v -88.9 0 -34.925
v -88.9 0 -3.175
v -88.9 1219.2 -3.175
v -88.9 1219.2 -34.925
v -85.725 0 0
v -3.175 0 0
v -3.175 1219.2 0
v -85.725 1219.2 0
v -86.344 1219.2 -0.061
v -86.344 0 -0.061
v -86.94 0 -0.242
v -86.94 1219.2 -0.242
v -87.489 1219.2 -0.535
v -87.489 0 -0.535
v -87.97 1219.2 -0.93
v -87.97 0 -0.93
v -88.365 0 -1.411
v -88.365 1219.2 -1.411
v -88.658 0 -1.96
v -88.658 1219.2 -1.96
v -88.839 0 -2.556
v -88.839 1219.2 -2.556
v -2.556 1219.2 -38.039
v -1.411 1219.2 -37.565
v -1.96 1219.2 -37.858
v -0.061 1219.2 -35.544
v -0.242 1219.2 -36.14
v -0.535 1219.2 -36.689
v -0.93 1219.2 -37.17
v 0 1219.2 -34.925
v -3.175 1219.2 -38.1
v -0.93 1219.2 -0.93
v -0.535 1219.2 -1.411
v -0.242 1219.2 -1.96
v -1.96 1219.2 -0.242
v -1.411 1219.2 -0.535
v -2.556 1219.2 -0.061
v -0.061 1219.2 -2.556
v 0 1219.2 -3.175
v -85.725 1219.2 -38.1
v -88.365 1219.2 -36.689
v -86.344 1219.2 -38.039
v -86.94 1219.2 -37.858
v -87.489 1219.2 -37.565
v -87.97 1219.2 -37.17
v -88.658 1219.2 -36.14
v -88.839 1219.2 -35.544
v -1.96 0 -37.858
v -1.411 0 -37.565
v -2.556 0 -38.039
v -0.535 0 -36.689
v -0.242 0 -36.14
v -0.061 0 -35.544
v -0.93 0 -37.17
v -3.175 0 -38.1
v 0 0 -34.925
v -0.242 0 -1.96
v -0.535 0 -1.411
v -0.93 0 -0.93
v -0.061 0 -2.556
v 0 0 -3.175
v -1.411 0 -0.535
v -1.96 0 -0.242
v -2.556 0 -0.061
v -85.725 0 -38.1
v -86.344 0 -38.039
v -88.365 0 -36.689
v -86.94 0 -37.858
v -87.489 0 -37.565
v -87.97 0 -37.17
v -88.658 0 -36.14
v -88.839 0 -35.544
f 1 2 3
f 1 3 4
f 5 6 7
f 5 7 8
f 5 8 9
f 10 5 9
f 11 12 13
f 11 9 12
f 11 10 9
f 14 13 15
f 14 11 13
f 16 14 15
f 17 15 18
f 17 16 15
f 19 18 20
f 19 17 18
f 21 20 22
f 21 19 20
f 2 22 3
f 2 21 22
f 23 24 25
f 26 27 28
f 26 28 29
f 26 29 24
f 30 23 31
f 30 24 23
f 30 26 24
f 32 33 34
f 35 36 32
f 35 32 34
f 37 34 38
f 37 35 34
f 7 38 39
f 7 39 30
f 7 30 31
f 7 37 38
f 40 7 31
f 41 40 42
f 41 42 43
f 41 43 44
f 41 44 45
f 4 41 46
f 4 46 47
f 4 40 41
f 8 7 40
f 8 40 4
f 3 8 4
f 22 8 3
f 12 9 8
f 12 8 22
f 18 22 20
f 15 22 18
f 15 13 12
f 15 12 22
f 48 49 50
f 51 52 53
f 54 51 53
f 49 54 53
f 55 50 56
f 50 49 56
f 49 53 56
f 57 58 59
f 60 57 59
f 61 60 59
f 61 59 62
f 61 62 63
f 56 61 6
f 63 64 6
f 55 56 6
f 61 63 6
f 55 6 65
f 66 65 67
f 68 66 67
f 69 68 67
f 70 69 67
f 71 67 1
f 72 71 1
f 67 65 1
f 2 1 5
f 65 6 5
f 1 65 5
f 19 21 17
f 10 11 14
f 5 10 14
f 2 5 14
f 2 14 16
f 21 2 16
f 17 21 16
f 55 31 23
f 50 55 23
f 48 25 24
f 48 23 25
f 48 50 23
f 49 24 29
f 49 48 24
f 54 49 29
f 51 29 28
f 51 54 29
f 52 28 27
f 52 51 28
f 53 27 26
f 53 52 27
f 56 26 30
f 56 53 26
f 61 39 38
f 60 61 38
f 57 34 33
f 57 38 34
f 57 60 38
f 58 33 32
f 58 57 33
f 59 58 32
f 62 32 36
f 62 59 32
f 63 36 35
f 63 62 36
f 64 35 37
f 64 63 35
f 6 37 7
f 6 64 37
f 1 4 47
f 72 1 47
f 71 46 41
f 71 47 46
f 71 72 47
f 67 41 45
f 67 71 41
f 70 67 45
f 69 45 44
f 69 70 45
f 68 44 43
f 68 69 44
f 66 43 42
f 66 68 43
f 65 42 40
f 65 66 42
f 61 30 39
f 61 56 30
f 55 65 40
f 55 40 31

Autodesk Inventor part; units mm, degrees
ref_plane "YZ Plane" through (0, 0, 0) normal (1, 0, 0) x (0, 1, 0)
ref_plane "XZ Plane" through (0, 0, 0) normal (0, 1, 0) x (-1, 0, 0)
ref_plane "XY Plane" through (0, 0, 0) normal (0, 0, 1) x (1, 0, 0)
sketch "Sketch1" plane through (0, 0, 0) normal (0, 1, 0) x (-1, 0, 0)
  line L0 (3.175, 0) -> (85.725, 0)
  line L1 (88.9, -3.175) -> (88.9, -34.925)
  line L2 (85.725, -38.1) -> (3.175, -38.1)
  line L3 (0, -34.925) -> (0, -3.175)
  arc A0 (88.9, -3.175) -> (85.725, 0) centre (85.725, -3.175) ccw
  arc A1 (85.725, -38.1) -> (88.9, -34.925) centre (85.725, -34.925) ccw
  arc A2 (0, -34.925) -> (3.175, -38.1) centre (3.175, -34.925) ccw
  arc A3 (3.175, 0) -> (0, -3.175) centre (3.175, -3.175) ccw
  point P0 (0, 0)
  point P1 (88.9, -38.1)
  point P2 (88.9, 0)
  point P3 (0, -38.1)
  dimension "d0" = 88.9
  dimension "d1" = 38.1
  dimension "d2" = 3.175
extrude "Extrusion1" add sketch "Sketch1" along normal blind 1219.2
sketch "Sketch2" plane through (-3.175, 0, -38.1) normal (0, 0, -1) x (-1, 0, 0)
  line L0 (0, 0) -> (82.55, 0) construction
  line L1 (82.55, 0) -> (82.55, 1219.2) construction
  line L2 (0, 1219.2) -> (82.55, 1219.2) construction
  line L3 (0, 0) -> (0, 1219.2) construction
  line L4 (60.325, 1219.2) -> (60.325, 914.4) construction
  line L5 (60.325, 914.4) -> (60.325, 609.6) construction
  line L6 (60.325, 609.6) -> (60.325, 304.8) construction
  line L7 (60.325, 304.8) -> (60.325, 0) construction
  circle A0 centre (60.325, 940.6001) radius 1.5875
  circle A1 centre (60.325, 888.1999) radius 1.5875
  circle A2 centre (60.325, 635.8001) radius 1.5875
  circle A3 centre (60.325, 583.3999) radius 1.5875
  circle A4 centre (60.325, 331.0001) radius 1.5875
  circle A5 centre (60.325, 278.5999) radius 1.5875
  line L8 (85.725, 0) -> (85.725, 1219.2) projected
  line L9 (60.325, 914.4) -> (22.225, 914.4) construction
  circle A6 centre (22.225, 914.4) radius 1.5875
  line L10 (60.325, 609.6) -> (22.225, 609.6) construction
  circle A7 centre (22.225, 609.6) radius 1.5875
  line L11 (60.325, 304.8) -> (22.225, 304.8) construction
  circle A8 centre (22.225, 304.8) radius 1.5875
  point P0 (-3.175, 0)
  point P1 (85.725, 609.6)
  dimension "d5" = 3.175
  dimension "d6" = 26.2001
  dimension "d7" = 26.2001
  dimension "d8" = 3.175
  dimension "d9" = 26.2001
  dimension "d10" = 26.2001
  dimension "d11" = 3.175
  dimension "d12" = 26.2001
  dimension "d13" = 26.2001
  dimension "d16" = 25.4
  dimension "d17" = 38.1
  dimension "d18" = 38.1
  dimension "d19" = 38.1
extrude "Extrusion2" [suppressed]
equation "\"d7\" = d6"
equation "\"d10\" = d9"
equation "\"d13\" = d12"
properties part number "Horizontal Beam 4ft" material "Wood (Birch)"
